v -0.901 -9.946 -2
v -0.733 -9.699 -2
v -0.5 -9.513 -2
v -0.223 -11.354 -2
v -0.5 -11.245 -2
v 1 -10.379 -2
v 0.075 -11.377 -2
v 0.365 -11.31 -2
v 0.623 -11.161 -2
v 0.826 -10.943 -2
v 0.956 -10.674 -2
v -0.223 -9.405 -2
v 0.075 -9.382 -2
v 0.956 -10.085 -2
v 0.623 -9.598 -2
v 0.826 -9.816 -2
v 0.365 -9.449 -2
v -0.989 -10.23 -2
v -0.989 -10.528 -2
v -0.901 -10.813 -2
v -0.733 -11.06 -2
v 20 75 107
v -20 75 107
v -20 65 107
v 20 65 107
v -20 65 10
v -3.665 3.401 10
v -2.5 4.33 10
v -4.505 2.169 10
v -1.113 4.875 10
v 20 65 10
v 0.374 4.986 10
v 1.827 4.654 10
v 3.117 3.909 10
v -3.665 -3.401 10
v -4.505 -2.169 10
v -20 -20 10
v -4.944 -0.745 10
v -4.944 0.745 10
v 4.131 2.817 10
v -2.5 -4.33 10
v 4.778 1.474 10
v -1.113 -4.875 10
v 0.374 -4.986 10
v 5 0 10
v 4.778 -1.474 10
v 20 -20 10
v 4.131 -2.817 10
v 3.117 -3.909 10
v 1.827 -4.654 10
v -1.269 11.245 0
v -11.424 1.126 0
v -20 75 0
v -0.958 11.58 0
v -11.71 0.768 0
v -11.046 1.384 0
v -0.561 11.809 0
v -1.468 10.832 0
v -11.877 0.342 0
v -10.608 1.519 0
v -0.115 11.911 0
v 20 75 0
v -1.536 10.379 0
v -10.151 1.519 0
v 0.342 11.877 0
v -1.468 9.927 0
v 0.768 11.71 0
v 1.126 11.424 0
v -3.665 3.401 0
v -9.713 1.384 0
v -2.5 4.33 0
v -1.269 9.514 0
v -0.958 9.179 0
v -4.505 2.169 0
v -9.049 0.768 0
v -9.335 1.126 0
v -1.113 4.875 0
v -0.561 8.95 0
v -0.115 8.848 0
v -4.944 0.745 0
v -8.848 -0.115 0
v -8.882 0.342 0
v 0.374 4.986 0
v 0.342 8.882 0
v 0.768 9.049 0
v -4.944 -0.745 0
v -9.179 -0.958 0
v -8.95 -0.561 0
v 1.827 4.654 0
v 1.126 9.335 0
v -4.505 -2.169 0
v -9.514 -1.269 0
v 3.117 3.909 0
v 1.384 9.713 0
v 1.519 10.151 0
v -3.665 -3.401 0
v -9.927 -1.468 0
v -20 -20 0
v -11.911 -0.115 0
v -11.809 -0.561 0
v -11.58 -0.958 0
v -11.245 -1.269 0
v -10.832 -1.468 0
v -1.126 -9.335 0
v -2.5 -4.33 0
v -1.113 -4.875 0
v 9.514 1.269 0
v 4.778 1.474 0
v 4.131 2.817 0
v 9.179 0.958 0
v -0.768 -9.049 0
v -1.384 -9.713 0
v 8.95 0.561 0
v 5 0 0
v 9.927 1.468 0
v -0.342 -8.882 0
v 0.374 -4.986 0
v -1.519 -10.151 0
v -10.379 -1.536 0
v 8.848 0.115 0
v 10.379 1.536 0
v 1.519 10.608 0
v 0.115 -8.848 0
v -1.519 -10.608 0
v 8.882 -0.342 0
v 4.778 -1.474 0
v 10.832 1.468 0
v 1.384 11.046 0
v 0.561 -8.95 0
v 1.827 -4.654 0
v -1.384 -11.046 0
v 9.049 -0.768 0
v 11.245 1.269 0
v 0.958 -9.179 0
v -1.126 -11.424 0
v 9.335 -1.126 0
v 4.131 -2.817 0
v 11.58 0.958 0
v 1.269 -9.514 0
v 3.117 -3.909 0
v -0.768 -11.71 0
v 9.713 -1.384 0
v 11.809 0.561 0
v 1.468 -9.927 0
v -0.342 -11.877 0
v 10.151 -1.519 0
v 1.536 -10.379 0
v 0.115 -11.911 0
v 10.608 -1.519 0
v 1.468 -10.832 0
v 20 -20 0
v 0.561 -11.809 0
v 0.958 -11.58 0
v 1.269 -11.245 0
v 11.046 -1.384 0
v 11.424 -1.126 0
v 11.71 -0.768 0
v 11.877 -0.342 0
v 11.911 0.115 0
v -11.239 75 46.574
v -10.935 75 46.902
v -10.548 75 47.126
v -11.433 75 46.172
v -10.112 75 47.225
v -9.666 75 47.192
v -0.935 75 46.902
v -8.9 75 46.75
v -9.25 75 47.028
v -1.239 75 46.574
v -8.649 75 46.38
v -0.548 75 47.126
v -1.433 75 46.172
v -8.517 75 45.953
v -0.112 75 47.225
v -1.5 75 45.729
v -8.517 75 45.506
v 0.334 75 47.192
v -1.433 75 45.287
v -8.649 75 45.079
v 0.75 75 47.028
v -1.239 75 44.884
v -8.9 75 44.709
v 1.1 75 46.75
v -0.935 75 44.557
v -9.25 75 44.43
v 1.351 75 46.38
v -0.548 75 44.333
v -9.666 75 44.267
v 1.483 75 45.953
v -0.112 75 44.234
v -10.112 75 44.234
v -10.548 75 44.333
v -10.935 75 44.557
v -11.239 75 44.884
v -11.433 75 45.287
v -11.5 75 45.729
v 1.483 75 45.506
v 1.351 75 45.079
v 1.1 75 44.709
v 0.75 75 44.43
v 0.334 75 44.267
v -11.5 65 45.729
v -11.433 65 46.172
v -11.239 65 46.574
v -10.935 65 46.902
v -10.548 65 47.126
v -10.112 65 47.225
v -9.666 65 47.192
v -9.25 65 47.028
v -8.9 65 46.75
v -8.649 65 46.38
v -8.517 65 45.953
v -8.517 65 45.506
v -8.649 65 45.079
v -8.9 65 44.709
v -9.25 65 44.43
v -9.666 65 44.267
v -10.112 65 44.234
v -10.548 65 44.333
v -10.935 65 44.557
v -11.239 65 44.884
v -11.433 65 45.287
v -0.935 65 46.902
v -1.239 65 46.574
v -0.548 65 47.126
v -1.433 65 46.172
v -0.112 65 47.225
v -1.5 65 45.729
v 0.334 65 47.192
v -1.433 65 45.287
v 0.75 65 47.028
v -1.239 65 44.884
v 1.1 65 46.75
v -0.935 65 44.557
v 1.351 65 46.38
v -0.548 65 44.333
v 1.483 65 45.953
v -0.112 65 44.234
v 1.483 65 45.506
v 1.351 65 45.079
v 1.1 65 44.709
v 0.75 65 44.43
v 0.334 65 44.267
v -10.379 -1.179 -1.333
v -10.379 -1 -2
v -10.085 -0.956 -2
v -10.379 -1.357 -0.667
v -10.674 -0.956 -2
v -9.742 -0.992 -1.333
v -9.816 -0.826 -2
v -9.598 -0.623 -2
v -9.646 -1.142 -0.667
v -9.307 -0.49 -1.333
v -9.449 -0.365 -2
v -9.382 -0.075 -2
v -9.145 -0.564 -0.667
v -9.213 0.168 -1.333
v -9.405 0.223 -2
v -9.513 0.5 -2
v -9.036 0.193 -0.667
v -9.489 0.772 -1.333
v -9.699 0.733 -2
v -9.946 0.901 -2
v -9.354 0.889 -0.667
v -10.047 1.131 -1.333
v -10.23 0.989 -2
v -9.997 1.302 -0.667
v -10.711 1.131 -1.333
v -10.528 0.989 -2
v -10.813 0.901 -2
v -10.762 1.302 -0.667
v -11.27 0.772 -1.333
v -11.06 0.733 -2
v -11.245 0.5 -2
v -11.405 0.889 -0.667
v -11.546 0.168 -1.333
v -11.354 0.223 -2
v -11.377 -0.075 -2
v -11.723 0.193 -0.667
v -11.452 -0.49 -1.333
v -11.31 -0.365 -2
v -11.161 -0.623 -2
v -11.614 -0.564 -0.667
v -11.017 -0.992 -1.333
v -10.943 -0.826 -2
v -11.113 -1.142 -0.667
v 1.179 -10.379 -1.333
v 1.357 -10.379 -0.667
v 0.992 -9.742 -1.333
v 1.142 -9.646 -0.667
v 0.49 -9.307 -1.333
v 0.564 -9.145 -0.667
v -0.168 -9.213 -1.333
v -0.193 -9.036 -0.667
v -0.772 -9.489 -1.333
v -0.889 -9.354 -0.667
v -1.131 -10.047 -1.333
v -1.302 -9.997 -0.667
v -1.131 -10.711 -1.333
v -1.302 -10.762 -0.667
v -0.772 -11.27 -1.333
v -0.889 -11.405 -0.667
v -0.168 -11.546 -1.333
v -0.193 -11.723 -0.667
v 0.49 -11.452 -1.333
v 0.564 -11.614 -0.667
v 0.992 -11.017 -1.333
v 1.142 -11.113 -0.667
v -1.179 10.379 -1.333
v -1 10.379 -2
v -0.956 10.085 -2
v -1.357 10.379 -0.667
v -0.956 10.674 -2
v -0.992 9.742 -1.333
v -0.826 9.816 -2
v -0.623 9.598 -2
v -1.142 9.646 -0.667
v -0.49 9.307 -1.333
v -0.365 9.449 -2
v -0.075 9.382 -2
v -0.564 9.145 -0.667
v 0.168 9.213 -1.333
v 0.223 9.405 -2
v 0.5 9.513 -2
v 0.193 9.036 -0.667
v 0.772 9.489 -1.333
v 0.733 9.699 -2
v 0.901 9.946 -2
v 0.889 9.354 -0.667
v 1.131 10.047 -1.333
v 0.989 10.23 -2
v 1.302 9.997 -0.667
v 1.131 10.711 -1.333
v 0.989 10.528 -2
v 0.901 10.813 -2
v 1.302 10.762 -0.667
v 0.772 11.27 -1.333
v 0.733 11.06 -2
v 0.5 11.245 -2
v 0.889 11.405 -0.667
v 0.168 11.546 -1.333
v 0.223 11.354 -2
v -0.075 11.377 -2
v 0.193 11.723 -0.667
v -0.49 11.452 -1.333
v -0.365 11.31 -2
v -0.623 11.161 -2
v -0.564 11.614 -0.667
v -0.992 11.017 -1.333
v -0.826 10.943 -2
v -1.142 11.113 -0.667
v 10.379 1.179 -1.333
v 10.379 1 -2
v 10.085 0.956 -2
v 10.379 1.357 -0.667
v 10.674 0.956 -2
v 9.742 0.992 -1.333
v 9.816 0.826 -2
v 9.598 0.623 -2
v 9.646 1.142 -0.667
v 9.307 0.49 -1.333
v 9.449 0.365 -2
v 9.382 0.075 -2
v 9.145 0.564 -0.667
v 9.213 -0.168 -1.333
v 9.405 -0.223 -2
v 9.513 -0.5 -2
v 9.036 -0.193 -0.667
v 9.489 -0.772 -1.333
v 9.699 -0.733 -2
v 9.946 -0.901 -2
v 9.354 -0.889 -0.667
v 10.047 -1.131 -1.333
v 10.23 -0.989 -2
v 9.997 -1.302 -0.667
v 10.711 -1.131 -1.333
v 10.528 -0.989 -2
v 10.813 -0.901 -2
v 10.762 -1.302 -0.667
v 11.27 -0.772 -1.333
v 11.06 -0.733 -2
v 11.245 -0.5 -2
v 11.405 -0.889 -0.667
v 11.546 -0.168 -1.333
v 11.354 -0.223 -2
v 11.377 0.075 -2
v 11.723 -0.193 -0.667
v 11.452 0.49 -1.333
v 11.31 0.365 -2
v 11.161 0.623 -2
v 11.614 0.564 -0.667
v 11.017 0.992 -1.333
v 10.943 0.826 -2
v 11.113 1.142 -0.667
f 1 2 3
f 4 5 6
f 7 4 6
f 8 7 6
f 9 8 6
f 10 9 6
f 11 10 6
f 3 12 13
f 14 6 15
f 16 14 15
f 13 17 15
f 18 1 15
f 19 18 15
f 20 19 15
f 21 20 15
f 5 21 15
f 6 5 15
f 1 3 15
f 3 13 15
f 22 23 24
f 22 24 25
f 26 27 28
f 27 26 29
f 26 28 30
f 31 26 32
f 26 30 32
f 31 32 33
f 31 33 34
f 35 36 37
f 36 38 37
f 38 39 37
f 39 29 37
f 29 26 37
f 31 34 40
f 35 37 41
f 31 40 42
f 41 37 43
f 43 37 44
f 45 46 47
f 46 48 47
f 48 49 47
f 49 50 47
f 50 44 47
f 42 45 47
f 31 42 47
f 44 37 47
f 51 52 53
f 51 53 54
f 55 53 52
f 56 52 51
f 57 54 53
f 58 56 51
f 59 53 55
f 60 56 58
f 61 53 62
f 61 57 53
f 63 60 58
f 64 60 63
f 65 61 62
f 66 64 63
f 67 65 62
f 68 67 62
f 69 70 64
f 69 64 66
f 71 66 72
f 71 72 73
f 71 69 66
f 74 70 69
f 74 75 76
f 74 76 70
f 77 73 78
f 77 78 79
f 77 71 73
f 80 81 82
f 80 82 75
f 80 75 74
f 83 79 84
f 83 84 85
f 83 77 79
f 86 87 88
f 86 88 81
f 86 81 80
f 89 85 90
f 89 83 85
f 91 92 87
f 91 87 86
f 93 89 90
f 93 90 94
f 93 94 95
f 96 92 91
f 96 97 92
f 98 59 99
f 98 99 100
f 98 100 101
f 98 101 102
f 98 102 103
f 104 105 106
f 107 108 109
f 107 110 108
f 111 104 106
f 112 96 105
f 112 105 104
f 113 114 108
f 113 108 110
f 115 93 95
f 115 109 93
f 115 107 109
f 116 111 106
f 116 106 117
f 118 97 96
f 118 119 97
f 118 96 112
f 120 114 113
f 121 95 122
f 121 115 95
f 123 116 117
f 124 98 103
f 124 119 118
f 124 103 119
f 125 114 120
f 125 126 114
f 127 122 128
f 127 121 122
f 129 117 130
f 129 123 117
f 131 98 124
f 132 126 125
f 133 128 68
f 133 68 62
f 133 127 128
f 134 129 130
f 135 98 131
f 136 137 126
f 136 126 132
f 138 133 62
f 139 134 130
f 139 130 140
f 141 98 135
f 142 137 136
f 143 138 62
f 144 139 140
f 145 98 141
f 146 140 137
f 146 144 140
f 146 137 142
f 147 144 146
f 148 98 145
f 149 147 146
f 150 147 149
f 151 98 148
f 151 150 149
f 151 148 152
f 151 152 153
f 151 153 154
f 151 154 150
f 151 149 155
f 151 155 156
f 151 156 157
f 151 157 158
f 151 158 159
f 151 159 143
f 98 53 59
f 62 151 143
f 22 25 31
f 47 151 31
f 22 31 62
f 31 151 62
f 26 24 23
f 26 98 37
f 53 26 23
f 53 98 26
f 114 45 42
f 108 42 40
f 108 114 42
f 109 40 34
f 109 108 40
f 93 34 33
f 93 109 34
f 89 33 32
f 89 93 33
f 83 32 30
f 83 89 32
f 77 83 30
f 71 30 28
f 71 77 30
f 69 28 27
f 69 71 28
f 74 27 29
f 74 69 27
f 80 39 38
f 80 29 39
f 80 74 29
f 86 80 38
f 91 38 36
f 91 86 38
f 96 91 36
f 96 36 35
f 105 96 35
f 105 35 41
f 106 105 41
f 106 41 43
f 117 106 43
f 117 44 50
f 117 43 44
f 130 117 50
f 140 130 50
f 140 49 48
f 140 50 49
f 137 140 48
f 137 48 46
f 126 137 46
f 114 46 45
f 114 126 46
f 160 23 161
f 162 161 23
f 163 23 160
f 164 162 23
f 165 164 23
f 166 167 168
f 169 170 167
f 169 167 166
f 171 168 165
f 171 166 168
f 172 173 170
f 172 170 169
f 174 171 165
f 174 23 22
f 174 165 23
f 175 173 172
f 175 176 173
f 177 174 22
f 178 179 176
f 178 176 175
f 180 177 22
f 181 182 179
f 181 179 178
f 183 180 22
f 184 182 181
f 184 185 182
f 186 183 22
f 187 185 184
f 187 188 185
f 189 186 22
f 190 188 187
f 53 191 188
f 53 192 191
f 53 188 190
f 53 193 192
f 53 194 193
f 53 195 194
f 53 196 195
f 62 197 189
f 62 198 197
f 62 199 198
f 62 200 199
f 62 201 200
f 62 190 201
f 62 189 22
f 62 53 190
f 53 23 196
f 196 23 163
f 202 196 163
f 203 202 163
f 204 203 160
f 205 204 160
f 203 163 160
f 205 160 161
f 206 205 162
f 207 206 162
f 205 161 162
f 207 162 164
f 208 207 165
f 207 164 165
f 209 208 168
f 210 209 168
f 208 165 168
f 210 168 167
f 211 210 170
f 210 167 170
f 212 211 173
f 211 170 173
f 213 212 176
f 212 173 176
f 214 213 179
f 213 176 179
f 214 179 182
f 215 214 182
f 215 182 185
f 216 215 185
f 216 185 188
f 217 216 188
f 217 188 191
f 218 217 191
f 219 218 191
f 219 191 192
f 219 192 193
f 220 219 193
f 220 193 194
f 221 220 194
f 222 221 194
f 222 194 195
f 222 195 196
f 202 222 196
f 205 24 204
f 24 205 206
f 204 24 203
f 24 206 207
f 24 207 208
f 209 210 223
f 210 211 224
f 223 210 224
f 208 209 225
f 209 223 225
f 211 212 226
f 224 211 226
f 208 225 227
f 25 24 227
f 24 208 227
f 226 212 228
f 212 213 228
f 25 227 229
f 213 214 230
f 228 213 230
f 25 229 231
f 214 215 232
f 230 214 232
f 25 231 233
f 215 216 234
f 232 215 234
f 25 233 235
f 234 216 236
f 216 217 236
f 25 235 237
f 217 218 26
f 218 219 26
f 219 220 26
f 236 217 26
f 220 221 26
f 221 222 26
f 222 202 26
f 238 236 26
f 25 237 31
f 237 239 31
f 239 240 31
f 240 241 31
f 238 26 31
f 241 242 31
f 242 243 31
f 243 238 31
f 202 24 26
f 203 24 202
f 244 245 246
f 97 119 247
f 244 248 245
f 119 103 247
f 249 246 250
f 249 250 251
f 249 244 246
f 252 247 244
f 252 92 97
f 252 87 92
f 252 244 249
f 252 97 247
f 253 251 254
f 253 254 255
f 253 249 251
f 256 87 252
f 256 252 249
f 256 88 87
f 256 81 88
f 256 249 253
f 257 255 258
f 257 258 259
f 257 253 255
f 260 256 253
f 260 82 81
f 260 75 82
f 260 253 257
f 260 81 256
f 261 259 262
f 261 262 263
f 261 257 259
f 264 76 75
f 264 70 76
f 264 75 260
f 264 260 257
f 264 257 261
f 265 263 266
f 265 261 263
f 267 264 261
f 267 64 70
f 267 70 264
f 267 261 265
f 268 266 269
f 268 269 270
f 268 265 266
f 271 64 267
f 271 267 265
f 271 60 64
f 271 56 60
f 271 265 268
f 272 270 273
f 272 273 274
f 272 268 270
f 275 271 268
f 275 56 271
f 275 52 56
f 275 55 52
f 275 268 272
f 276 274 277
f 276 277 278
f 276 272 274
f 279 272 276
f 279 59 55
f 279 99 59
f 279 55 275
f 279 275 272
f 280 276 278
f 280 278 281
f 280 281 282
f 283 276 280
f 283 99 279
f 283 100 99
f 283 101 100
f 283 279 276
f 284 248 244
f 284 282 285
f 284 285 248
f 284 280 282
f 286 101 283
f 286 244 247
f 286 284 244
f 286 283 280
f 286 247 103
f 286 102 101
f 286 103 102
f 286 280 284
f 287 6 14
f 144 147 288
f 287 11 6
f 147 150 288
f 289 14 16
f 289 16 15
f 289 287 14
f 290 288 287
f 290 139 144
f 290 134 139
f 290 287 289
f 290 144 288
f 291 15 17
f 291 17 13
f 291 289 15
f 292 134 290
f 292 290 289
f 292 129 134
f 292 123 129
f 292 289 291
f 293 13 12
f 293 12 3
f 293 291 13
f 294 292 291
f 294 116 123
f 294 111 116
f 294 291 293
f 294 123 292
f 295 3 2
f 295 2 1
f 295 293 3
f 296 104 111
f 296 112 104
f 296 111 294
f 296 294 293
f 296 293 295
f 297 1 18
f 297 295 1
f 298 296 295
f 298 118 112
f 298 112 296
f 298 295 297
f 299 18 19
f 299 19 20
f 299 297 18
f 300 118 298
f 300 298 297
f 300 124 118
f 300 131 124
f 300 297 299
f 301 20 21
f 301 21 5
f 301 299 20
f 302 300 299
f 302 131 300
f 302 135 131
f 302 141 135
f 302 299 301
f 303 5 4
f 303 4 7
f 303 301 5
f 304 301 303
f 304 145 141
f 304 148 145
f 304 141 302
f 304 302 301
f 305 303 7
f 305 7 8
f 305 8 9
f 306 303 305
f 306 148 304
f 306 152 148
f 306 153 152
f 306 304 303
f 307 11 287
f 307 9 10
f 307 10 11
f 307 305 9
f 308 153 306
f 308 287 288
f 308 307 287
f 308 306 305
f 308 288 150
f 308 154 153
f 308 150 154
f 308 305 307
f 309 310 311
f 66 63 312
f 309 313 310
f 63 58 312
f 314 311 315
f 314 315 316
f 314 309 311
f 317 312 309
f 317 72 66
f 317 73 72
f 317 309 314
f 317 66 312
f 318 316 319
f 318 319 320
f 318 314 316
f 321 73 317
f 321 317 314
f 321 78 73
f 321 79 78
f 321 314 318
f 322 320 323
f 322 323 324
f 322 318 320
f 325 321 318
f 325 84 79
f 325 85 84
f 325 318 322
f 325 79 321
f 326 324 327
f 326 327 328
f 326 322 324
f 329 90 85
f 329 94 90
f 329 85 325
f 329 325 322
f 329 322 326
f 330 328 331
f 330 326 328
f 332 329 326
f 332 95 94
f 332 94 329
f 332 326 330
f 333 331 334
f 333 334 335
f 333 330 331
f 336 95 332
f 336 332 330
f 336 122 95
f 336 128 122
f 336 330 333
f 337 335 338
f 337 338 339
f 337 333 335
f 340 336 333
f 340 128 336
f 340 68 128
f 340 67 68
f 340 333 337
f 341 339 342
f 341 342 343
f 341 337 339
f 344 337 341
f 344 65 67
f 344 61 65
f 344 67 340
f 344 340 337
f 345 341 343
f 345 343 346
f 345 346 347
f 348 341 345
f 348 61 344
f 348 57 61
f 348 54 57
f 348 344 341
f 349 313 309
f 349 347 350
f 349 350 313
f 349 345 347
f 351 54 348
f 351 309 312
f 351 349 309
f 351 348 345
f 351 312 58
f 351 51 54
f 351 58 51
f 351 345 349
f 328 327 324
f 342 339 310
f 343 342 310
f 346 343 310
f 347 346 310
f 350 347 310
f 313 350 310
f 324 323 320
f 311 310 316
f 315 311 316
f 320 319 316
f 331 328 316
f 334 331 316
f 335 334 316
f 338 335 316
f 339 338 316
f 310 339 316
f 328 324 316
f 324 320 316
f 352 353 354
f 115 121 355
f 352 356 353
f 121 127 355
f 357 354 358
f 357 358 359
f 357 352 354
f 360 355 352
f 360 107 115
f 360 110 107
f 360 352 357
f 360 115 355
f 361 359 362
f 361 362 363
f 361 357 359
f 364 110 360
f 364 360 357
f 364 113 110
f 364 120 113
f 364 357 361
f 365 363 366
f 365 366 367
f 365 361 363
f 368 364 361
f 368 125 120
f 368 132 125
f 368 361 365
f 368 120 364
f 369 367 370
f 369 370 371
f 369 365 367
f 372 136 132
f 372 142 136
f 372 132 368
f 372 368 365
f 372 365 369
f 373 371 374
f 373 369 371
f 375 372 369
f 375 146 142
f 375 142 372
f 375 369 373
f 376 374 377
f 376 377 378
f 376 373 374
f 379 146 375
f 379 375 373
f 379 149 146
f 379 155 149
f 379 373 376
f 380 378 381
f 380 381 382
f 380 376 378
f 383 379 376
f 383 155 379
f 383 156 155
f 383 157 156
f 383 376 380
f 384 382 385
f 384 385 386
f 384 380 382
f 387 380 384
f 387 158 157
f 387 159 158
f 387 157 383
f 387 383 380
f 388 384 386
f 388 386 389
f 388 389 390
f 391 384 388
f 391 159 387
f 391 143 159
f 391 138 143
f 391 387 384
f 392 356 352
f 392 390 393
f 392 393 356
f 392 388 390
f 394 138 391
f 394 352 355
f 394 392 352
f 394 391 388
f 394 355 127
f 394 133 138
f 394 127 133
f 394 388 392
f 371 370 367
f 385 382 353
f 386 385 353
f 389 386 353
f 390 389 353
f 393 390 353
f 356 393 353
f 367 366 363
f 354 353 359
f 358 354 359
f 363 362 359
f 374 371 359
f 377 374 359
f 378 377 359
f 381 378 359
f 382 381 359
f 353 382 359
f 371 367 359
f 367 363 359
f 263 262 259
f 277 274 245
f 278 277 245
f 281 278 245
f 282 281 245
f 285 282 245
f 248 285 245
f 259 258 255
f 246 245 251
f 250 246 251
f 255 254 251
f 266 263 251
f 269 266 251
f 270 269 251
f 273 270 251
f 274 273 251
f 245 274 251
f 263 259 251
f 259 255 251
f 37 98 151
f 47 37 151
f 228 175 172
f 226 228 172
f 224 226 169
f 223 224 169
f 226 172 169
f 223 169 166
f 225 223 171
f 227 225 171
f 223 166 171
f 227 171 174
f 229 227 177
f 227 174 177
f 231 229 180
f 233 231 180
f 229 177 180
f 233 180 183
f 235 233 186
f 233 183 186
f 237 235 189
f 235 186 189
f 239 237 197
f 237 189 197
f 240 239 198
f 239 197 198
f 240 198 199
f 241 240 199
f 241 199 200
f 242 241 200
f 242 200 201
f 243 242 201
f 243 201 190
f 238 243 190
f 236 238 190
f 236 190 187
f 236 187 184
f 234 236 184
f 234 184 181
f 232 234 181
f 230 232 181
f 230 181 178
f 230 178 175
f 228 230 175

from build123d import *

# Parameters (mm, degrees)
SKETCH_4_W               = 40
SKETCH_4_H               = 40
EXTRUDE_1_DEPTH          = 10
SKETCH_1_R               = 5
CUT_EXTRUDE_1_DEPTH      = 19
SKETCH_5_W               = 40
SKETCH_5_H               = 10
EXTRUDE_2_DEPTH          = 55
SKETCH_6_W               = 40
SKETCH_6_H               = 10
EXTRUDE_3_DEPTH          = 97
SKETCH_7_R               = 1.5
CUT_EXTRUDE_2_DEPTH      = 17
PATTERN_LINEAR_1_COUNT   = 2
PATTERN_LINEAR_1_PITCH   = 10
SKETCH_10_R              = 1
EXTRUDE_5_DEPTH          = 2
PATTERN_CIRCULAR_3_COUNT = 4
DRAFT_2_ANGLE            = 15
DRAFT_3_ANGLE            = 15
DRAFT_4_ANGLE            = 15
DRAFT_5_ANGLE            = 15


with BuildPart() as part:
    # 草图4 → 凸台-拉伸1 (new body)
    with BuildSketch(Plane.XY):
        Rectangle(SKETCH_4_W, SKETCH_4_H)
    extrude(amount=EXTRUDE_1_DEPTH)

    # 草图1 → 切除-拉伸1 (cut)
    with BuildSketch(Plane.XY):
        Circle(SKETCH_1_R)
    extrude(amount=CUT_EXTRUDE_1_DEPTH, mode=Mode.SUBTRACT)

    # 草图5 → 凸台-拉伸2 (add)
    with BuildSketch(Plane(origin=(0, 20, 0), x_dir=(1, 0, 0), z_dir=(0, 1, 0))):
        with Locations((0, -5)):
            Rectangle(SKETCH_5_W, SKETCH_5_H)
    extrude(amount=EXTRUDE_2_DEPTH)

    # 草图6 → 凸台-拉伸3 (add)
    with BuildSketch(Plane.XY.offset(10)):
        with Locations((0, 70)):
            Rectangle(SKETCH_6_W, SKETCH_6_H)
    extrude(amount=EXTRUDE_3_DEPTH)

    # 草图7 → 切除-拉伸2 (cut)
    with BuildSketch(Plane(origin=(0, 75, 0), x_dir=(1, 0, 0), z_dir=(0, 1, 0))):
        with Locations((0, -45.729405638)):
            Circle(SKETCH_7_R)
    cut_extrude_2 = extrude(amount=-CUT_EXTRUDE_2_DEPTH, mode=Mode.SUBTRACT)

    # 阵列(线性)1: 切除-拉伸2 ×2
    with Locations(*[(-i * PATTERN_LINEAR_1_PITCH, 0, 0) for i in range(1, PATTERN_LINEAR_1_COUNT)]):
        add(cut_extrude_2, mode=Mode.SUBTRACT)

    # 草图10 → 凸台-拉伸5 (add)
    with BuildSketch(Plane.XY):
        with Locations((0, -10.379430626)):
            Circle(SKETCH_10_R)
    extrude_5 = extrude(amount=-EXTRUDE_5_DEPTH)

    # 阵列(圆周)3: 凸台-拉伸5 ×4 about axis
    pattern_circular_3_axis = Axis((0, 0, 0), (0, 0, 1))
    for i in range(1, PATTERN_CIRCULAR_3_COUNT):
        add(extrude_5.rotate(pattern_circular_3_axis, i * 360 / PATTERN_CIRCULAR_3_COUNT))

    # 拔模2
    draft_2_faces = [part.faces().sort_by_distance(p)[0] for p in [
        (-1, -10.379430626, -1),
    ]]
    draft(draft_2_faces, Plane(origin=(0, -10.379430626, -2), x_dir=(-1, 0, 0), z_dir=(0, 0, -1)), DRAFT_2_ANGLE)

    # 拔模3
    draft_3_faces = [part.faces().sort_by_distance(p)[0] for p in [
        (10.379430626, -1, -1),
    ]]
    draft(draft_3_faces, Plane(origin=(10.379430626, 0, -2), x_dir=(-1, 0, 0), z_dir=(0, 0, -1)), DRAFT_3_ANGLE)

    # 拔模4
    draft_4_faces = [part.faces().sort_by_distance(p)[0] for p in [
        (1, 10.379430626, -1),
    ]]
    draft(draft_4_faces, Plane(origin=(0, 10.379430626, -2), x_dir=(-1, 0, 0), z_dir=(0, 0, -1)), DRAFT_4_ANGLE)

    # 拔模5
    draft_5_faces = [part.faces().sort_by_distance(p)[0] for p in [
        (-10.379430626, 1, -1),
    ]]
    draft(draft_5_faces, Plane(origin=(-10.379430626, 0, -2), x_dir=(-1, 0, 0), z_dir=(0, 0, -1)), DRAFT_5_ANGLE)


solid = part.part
